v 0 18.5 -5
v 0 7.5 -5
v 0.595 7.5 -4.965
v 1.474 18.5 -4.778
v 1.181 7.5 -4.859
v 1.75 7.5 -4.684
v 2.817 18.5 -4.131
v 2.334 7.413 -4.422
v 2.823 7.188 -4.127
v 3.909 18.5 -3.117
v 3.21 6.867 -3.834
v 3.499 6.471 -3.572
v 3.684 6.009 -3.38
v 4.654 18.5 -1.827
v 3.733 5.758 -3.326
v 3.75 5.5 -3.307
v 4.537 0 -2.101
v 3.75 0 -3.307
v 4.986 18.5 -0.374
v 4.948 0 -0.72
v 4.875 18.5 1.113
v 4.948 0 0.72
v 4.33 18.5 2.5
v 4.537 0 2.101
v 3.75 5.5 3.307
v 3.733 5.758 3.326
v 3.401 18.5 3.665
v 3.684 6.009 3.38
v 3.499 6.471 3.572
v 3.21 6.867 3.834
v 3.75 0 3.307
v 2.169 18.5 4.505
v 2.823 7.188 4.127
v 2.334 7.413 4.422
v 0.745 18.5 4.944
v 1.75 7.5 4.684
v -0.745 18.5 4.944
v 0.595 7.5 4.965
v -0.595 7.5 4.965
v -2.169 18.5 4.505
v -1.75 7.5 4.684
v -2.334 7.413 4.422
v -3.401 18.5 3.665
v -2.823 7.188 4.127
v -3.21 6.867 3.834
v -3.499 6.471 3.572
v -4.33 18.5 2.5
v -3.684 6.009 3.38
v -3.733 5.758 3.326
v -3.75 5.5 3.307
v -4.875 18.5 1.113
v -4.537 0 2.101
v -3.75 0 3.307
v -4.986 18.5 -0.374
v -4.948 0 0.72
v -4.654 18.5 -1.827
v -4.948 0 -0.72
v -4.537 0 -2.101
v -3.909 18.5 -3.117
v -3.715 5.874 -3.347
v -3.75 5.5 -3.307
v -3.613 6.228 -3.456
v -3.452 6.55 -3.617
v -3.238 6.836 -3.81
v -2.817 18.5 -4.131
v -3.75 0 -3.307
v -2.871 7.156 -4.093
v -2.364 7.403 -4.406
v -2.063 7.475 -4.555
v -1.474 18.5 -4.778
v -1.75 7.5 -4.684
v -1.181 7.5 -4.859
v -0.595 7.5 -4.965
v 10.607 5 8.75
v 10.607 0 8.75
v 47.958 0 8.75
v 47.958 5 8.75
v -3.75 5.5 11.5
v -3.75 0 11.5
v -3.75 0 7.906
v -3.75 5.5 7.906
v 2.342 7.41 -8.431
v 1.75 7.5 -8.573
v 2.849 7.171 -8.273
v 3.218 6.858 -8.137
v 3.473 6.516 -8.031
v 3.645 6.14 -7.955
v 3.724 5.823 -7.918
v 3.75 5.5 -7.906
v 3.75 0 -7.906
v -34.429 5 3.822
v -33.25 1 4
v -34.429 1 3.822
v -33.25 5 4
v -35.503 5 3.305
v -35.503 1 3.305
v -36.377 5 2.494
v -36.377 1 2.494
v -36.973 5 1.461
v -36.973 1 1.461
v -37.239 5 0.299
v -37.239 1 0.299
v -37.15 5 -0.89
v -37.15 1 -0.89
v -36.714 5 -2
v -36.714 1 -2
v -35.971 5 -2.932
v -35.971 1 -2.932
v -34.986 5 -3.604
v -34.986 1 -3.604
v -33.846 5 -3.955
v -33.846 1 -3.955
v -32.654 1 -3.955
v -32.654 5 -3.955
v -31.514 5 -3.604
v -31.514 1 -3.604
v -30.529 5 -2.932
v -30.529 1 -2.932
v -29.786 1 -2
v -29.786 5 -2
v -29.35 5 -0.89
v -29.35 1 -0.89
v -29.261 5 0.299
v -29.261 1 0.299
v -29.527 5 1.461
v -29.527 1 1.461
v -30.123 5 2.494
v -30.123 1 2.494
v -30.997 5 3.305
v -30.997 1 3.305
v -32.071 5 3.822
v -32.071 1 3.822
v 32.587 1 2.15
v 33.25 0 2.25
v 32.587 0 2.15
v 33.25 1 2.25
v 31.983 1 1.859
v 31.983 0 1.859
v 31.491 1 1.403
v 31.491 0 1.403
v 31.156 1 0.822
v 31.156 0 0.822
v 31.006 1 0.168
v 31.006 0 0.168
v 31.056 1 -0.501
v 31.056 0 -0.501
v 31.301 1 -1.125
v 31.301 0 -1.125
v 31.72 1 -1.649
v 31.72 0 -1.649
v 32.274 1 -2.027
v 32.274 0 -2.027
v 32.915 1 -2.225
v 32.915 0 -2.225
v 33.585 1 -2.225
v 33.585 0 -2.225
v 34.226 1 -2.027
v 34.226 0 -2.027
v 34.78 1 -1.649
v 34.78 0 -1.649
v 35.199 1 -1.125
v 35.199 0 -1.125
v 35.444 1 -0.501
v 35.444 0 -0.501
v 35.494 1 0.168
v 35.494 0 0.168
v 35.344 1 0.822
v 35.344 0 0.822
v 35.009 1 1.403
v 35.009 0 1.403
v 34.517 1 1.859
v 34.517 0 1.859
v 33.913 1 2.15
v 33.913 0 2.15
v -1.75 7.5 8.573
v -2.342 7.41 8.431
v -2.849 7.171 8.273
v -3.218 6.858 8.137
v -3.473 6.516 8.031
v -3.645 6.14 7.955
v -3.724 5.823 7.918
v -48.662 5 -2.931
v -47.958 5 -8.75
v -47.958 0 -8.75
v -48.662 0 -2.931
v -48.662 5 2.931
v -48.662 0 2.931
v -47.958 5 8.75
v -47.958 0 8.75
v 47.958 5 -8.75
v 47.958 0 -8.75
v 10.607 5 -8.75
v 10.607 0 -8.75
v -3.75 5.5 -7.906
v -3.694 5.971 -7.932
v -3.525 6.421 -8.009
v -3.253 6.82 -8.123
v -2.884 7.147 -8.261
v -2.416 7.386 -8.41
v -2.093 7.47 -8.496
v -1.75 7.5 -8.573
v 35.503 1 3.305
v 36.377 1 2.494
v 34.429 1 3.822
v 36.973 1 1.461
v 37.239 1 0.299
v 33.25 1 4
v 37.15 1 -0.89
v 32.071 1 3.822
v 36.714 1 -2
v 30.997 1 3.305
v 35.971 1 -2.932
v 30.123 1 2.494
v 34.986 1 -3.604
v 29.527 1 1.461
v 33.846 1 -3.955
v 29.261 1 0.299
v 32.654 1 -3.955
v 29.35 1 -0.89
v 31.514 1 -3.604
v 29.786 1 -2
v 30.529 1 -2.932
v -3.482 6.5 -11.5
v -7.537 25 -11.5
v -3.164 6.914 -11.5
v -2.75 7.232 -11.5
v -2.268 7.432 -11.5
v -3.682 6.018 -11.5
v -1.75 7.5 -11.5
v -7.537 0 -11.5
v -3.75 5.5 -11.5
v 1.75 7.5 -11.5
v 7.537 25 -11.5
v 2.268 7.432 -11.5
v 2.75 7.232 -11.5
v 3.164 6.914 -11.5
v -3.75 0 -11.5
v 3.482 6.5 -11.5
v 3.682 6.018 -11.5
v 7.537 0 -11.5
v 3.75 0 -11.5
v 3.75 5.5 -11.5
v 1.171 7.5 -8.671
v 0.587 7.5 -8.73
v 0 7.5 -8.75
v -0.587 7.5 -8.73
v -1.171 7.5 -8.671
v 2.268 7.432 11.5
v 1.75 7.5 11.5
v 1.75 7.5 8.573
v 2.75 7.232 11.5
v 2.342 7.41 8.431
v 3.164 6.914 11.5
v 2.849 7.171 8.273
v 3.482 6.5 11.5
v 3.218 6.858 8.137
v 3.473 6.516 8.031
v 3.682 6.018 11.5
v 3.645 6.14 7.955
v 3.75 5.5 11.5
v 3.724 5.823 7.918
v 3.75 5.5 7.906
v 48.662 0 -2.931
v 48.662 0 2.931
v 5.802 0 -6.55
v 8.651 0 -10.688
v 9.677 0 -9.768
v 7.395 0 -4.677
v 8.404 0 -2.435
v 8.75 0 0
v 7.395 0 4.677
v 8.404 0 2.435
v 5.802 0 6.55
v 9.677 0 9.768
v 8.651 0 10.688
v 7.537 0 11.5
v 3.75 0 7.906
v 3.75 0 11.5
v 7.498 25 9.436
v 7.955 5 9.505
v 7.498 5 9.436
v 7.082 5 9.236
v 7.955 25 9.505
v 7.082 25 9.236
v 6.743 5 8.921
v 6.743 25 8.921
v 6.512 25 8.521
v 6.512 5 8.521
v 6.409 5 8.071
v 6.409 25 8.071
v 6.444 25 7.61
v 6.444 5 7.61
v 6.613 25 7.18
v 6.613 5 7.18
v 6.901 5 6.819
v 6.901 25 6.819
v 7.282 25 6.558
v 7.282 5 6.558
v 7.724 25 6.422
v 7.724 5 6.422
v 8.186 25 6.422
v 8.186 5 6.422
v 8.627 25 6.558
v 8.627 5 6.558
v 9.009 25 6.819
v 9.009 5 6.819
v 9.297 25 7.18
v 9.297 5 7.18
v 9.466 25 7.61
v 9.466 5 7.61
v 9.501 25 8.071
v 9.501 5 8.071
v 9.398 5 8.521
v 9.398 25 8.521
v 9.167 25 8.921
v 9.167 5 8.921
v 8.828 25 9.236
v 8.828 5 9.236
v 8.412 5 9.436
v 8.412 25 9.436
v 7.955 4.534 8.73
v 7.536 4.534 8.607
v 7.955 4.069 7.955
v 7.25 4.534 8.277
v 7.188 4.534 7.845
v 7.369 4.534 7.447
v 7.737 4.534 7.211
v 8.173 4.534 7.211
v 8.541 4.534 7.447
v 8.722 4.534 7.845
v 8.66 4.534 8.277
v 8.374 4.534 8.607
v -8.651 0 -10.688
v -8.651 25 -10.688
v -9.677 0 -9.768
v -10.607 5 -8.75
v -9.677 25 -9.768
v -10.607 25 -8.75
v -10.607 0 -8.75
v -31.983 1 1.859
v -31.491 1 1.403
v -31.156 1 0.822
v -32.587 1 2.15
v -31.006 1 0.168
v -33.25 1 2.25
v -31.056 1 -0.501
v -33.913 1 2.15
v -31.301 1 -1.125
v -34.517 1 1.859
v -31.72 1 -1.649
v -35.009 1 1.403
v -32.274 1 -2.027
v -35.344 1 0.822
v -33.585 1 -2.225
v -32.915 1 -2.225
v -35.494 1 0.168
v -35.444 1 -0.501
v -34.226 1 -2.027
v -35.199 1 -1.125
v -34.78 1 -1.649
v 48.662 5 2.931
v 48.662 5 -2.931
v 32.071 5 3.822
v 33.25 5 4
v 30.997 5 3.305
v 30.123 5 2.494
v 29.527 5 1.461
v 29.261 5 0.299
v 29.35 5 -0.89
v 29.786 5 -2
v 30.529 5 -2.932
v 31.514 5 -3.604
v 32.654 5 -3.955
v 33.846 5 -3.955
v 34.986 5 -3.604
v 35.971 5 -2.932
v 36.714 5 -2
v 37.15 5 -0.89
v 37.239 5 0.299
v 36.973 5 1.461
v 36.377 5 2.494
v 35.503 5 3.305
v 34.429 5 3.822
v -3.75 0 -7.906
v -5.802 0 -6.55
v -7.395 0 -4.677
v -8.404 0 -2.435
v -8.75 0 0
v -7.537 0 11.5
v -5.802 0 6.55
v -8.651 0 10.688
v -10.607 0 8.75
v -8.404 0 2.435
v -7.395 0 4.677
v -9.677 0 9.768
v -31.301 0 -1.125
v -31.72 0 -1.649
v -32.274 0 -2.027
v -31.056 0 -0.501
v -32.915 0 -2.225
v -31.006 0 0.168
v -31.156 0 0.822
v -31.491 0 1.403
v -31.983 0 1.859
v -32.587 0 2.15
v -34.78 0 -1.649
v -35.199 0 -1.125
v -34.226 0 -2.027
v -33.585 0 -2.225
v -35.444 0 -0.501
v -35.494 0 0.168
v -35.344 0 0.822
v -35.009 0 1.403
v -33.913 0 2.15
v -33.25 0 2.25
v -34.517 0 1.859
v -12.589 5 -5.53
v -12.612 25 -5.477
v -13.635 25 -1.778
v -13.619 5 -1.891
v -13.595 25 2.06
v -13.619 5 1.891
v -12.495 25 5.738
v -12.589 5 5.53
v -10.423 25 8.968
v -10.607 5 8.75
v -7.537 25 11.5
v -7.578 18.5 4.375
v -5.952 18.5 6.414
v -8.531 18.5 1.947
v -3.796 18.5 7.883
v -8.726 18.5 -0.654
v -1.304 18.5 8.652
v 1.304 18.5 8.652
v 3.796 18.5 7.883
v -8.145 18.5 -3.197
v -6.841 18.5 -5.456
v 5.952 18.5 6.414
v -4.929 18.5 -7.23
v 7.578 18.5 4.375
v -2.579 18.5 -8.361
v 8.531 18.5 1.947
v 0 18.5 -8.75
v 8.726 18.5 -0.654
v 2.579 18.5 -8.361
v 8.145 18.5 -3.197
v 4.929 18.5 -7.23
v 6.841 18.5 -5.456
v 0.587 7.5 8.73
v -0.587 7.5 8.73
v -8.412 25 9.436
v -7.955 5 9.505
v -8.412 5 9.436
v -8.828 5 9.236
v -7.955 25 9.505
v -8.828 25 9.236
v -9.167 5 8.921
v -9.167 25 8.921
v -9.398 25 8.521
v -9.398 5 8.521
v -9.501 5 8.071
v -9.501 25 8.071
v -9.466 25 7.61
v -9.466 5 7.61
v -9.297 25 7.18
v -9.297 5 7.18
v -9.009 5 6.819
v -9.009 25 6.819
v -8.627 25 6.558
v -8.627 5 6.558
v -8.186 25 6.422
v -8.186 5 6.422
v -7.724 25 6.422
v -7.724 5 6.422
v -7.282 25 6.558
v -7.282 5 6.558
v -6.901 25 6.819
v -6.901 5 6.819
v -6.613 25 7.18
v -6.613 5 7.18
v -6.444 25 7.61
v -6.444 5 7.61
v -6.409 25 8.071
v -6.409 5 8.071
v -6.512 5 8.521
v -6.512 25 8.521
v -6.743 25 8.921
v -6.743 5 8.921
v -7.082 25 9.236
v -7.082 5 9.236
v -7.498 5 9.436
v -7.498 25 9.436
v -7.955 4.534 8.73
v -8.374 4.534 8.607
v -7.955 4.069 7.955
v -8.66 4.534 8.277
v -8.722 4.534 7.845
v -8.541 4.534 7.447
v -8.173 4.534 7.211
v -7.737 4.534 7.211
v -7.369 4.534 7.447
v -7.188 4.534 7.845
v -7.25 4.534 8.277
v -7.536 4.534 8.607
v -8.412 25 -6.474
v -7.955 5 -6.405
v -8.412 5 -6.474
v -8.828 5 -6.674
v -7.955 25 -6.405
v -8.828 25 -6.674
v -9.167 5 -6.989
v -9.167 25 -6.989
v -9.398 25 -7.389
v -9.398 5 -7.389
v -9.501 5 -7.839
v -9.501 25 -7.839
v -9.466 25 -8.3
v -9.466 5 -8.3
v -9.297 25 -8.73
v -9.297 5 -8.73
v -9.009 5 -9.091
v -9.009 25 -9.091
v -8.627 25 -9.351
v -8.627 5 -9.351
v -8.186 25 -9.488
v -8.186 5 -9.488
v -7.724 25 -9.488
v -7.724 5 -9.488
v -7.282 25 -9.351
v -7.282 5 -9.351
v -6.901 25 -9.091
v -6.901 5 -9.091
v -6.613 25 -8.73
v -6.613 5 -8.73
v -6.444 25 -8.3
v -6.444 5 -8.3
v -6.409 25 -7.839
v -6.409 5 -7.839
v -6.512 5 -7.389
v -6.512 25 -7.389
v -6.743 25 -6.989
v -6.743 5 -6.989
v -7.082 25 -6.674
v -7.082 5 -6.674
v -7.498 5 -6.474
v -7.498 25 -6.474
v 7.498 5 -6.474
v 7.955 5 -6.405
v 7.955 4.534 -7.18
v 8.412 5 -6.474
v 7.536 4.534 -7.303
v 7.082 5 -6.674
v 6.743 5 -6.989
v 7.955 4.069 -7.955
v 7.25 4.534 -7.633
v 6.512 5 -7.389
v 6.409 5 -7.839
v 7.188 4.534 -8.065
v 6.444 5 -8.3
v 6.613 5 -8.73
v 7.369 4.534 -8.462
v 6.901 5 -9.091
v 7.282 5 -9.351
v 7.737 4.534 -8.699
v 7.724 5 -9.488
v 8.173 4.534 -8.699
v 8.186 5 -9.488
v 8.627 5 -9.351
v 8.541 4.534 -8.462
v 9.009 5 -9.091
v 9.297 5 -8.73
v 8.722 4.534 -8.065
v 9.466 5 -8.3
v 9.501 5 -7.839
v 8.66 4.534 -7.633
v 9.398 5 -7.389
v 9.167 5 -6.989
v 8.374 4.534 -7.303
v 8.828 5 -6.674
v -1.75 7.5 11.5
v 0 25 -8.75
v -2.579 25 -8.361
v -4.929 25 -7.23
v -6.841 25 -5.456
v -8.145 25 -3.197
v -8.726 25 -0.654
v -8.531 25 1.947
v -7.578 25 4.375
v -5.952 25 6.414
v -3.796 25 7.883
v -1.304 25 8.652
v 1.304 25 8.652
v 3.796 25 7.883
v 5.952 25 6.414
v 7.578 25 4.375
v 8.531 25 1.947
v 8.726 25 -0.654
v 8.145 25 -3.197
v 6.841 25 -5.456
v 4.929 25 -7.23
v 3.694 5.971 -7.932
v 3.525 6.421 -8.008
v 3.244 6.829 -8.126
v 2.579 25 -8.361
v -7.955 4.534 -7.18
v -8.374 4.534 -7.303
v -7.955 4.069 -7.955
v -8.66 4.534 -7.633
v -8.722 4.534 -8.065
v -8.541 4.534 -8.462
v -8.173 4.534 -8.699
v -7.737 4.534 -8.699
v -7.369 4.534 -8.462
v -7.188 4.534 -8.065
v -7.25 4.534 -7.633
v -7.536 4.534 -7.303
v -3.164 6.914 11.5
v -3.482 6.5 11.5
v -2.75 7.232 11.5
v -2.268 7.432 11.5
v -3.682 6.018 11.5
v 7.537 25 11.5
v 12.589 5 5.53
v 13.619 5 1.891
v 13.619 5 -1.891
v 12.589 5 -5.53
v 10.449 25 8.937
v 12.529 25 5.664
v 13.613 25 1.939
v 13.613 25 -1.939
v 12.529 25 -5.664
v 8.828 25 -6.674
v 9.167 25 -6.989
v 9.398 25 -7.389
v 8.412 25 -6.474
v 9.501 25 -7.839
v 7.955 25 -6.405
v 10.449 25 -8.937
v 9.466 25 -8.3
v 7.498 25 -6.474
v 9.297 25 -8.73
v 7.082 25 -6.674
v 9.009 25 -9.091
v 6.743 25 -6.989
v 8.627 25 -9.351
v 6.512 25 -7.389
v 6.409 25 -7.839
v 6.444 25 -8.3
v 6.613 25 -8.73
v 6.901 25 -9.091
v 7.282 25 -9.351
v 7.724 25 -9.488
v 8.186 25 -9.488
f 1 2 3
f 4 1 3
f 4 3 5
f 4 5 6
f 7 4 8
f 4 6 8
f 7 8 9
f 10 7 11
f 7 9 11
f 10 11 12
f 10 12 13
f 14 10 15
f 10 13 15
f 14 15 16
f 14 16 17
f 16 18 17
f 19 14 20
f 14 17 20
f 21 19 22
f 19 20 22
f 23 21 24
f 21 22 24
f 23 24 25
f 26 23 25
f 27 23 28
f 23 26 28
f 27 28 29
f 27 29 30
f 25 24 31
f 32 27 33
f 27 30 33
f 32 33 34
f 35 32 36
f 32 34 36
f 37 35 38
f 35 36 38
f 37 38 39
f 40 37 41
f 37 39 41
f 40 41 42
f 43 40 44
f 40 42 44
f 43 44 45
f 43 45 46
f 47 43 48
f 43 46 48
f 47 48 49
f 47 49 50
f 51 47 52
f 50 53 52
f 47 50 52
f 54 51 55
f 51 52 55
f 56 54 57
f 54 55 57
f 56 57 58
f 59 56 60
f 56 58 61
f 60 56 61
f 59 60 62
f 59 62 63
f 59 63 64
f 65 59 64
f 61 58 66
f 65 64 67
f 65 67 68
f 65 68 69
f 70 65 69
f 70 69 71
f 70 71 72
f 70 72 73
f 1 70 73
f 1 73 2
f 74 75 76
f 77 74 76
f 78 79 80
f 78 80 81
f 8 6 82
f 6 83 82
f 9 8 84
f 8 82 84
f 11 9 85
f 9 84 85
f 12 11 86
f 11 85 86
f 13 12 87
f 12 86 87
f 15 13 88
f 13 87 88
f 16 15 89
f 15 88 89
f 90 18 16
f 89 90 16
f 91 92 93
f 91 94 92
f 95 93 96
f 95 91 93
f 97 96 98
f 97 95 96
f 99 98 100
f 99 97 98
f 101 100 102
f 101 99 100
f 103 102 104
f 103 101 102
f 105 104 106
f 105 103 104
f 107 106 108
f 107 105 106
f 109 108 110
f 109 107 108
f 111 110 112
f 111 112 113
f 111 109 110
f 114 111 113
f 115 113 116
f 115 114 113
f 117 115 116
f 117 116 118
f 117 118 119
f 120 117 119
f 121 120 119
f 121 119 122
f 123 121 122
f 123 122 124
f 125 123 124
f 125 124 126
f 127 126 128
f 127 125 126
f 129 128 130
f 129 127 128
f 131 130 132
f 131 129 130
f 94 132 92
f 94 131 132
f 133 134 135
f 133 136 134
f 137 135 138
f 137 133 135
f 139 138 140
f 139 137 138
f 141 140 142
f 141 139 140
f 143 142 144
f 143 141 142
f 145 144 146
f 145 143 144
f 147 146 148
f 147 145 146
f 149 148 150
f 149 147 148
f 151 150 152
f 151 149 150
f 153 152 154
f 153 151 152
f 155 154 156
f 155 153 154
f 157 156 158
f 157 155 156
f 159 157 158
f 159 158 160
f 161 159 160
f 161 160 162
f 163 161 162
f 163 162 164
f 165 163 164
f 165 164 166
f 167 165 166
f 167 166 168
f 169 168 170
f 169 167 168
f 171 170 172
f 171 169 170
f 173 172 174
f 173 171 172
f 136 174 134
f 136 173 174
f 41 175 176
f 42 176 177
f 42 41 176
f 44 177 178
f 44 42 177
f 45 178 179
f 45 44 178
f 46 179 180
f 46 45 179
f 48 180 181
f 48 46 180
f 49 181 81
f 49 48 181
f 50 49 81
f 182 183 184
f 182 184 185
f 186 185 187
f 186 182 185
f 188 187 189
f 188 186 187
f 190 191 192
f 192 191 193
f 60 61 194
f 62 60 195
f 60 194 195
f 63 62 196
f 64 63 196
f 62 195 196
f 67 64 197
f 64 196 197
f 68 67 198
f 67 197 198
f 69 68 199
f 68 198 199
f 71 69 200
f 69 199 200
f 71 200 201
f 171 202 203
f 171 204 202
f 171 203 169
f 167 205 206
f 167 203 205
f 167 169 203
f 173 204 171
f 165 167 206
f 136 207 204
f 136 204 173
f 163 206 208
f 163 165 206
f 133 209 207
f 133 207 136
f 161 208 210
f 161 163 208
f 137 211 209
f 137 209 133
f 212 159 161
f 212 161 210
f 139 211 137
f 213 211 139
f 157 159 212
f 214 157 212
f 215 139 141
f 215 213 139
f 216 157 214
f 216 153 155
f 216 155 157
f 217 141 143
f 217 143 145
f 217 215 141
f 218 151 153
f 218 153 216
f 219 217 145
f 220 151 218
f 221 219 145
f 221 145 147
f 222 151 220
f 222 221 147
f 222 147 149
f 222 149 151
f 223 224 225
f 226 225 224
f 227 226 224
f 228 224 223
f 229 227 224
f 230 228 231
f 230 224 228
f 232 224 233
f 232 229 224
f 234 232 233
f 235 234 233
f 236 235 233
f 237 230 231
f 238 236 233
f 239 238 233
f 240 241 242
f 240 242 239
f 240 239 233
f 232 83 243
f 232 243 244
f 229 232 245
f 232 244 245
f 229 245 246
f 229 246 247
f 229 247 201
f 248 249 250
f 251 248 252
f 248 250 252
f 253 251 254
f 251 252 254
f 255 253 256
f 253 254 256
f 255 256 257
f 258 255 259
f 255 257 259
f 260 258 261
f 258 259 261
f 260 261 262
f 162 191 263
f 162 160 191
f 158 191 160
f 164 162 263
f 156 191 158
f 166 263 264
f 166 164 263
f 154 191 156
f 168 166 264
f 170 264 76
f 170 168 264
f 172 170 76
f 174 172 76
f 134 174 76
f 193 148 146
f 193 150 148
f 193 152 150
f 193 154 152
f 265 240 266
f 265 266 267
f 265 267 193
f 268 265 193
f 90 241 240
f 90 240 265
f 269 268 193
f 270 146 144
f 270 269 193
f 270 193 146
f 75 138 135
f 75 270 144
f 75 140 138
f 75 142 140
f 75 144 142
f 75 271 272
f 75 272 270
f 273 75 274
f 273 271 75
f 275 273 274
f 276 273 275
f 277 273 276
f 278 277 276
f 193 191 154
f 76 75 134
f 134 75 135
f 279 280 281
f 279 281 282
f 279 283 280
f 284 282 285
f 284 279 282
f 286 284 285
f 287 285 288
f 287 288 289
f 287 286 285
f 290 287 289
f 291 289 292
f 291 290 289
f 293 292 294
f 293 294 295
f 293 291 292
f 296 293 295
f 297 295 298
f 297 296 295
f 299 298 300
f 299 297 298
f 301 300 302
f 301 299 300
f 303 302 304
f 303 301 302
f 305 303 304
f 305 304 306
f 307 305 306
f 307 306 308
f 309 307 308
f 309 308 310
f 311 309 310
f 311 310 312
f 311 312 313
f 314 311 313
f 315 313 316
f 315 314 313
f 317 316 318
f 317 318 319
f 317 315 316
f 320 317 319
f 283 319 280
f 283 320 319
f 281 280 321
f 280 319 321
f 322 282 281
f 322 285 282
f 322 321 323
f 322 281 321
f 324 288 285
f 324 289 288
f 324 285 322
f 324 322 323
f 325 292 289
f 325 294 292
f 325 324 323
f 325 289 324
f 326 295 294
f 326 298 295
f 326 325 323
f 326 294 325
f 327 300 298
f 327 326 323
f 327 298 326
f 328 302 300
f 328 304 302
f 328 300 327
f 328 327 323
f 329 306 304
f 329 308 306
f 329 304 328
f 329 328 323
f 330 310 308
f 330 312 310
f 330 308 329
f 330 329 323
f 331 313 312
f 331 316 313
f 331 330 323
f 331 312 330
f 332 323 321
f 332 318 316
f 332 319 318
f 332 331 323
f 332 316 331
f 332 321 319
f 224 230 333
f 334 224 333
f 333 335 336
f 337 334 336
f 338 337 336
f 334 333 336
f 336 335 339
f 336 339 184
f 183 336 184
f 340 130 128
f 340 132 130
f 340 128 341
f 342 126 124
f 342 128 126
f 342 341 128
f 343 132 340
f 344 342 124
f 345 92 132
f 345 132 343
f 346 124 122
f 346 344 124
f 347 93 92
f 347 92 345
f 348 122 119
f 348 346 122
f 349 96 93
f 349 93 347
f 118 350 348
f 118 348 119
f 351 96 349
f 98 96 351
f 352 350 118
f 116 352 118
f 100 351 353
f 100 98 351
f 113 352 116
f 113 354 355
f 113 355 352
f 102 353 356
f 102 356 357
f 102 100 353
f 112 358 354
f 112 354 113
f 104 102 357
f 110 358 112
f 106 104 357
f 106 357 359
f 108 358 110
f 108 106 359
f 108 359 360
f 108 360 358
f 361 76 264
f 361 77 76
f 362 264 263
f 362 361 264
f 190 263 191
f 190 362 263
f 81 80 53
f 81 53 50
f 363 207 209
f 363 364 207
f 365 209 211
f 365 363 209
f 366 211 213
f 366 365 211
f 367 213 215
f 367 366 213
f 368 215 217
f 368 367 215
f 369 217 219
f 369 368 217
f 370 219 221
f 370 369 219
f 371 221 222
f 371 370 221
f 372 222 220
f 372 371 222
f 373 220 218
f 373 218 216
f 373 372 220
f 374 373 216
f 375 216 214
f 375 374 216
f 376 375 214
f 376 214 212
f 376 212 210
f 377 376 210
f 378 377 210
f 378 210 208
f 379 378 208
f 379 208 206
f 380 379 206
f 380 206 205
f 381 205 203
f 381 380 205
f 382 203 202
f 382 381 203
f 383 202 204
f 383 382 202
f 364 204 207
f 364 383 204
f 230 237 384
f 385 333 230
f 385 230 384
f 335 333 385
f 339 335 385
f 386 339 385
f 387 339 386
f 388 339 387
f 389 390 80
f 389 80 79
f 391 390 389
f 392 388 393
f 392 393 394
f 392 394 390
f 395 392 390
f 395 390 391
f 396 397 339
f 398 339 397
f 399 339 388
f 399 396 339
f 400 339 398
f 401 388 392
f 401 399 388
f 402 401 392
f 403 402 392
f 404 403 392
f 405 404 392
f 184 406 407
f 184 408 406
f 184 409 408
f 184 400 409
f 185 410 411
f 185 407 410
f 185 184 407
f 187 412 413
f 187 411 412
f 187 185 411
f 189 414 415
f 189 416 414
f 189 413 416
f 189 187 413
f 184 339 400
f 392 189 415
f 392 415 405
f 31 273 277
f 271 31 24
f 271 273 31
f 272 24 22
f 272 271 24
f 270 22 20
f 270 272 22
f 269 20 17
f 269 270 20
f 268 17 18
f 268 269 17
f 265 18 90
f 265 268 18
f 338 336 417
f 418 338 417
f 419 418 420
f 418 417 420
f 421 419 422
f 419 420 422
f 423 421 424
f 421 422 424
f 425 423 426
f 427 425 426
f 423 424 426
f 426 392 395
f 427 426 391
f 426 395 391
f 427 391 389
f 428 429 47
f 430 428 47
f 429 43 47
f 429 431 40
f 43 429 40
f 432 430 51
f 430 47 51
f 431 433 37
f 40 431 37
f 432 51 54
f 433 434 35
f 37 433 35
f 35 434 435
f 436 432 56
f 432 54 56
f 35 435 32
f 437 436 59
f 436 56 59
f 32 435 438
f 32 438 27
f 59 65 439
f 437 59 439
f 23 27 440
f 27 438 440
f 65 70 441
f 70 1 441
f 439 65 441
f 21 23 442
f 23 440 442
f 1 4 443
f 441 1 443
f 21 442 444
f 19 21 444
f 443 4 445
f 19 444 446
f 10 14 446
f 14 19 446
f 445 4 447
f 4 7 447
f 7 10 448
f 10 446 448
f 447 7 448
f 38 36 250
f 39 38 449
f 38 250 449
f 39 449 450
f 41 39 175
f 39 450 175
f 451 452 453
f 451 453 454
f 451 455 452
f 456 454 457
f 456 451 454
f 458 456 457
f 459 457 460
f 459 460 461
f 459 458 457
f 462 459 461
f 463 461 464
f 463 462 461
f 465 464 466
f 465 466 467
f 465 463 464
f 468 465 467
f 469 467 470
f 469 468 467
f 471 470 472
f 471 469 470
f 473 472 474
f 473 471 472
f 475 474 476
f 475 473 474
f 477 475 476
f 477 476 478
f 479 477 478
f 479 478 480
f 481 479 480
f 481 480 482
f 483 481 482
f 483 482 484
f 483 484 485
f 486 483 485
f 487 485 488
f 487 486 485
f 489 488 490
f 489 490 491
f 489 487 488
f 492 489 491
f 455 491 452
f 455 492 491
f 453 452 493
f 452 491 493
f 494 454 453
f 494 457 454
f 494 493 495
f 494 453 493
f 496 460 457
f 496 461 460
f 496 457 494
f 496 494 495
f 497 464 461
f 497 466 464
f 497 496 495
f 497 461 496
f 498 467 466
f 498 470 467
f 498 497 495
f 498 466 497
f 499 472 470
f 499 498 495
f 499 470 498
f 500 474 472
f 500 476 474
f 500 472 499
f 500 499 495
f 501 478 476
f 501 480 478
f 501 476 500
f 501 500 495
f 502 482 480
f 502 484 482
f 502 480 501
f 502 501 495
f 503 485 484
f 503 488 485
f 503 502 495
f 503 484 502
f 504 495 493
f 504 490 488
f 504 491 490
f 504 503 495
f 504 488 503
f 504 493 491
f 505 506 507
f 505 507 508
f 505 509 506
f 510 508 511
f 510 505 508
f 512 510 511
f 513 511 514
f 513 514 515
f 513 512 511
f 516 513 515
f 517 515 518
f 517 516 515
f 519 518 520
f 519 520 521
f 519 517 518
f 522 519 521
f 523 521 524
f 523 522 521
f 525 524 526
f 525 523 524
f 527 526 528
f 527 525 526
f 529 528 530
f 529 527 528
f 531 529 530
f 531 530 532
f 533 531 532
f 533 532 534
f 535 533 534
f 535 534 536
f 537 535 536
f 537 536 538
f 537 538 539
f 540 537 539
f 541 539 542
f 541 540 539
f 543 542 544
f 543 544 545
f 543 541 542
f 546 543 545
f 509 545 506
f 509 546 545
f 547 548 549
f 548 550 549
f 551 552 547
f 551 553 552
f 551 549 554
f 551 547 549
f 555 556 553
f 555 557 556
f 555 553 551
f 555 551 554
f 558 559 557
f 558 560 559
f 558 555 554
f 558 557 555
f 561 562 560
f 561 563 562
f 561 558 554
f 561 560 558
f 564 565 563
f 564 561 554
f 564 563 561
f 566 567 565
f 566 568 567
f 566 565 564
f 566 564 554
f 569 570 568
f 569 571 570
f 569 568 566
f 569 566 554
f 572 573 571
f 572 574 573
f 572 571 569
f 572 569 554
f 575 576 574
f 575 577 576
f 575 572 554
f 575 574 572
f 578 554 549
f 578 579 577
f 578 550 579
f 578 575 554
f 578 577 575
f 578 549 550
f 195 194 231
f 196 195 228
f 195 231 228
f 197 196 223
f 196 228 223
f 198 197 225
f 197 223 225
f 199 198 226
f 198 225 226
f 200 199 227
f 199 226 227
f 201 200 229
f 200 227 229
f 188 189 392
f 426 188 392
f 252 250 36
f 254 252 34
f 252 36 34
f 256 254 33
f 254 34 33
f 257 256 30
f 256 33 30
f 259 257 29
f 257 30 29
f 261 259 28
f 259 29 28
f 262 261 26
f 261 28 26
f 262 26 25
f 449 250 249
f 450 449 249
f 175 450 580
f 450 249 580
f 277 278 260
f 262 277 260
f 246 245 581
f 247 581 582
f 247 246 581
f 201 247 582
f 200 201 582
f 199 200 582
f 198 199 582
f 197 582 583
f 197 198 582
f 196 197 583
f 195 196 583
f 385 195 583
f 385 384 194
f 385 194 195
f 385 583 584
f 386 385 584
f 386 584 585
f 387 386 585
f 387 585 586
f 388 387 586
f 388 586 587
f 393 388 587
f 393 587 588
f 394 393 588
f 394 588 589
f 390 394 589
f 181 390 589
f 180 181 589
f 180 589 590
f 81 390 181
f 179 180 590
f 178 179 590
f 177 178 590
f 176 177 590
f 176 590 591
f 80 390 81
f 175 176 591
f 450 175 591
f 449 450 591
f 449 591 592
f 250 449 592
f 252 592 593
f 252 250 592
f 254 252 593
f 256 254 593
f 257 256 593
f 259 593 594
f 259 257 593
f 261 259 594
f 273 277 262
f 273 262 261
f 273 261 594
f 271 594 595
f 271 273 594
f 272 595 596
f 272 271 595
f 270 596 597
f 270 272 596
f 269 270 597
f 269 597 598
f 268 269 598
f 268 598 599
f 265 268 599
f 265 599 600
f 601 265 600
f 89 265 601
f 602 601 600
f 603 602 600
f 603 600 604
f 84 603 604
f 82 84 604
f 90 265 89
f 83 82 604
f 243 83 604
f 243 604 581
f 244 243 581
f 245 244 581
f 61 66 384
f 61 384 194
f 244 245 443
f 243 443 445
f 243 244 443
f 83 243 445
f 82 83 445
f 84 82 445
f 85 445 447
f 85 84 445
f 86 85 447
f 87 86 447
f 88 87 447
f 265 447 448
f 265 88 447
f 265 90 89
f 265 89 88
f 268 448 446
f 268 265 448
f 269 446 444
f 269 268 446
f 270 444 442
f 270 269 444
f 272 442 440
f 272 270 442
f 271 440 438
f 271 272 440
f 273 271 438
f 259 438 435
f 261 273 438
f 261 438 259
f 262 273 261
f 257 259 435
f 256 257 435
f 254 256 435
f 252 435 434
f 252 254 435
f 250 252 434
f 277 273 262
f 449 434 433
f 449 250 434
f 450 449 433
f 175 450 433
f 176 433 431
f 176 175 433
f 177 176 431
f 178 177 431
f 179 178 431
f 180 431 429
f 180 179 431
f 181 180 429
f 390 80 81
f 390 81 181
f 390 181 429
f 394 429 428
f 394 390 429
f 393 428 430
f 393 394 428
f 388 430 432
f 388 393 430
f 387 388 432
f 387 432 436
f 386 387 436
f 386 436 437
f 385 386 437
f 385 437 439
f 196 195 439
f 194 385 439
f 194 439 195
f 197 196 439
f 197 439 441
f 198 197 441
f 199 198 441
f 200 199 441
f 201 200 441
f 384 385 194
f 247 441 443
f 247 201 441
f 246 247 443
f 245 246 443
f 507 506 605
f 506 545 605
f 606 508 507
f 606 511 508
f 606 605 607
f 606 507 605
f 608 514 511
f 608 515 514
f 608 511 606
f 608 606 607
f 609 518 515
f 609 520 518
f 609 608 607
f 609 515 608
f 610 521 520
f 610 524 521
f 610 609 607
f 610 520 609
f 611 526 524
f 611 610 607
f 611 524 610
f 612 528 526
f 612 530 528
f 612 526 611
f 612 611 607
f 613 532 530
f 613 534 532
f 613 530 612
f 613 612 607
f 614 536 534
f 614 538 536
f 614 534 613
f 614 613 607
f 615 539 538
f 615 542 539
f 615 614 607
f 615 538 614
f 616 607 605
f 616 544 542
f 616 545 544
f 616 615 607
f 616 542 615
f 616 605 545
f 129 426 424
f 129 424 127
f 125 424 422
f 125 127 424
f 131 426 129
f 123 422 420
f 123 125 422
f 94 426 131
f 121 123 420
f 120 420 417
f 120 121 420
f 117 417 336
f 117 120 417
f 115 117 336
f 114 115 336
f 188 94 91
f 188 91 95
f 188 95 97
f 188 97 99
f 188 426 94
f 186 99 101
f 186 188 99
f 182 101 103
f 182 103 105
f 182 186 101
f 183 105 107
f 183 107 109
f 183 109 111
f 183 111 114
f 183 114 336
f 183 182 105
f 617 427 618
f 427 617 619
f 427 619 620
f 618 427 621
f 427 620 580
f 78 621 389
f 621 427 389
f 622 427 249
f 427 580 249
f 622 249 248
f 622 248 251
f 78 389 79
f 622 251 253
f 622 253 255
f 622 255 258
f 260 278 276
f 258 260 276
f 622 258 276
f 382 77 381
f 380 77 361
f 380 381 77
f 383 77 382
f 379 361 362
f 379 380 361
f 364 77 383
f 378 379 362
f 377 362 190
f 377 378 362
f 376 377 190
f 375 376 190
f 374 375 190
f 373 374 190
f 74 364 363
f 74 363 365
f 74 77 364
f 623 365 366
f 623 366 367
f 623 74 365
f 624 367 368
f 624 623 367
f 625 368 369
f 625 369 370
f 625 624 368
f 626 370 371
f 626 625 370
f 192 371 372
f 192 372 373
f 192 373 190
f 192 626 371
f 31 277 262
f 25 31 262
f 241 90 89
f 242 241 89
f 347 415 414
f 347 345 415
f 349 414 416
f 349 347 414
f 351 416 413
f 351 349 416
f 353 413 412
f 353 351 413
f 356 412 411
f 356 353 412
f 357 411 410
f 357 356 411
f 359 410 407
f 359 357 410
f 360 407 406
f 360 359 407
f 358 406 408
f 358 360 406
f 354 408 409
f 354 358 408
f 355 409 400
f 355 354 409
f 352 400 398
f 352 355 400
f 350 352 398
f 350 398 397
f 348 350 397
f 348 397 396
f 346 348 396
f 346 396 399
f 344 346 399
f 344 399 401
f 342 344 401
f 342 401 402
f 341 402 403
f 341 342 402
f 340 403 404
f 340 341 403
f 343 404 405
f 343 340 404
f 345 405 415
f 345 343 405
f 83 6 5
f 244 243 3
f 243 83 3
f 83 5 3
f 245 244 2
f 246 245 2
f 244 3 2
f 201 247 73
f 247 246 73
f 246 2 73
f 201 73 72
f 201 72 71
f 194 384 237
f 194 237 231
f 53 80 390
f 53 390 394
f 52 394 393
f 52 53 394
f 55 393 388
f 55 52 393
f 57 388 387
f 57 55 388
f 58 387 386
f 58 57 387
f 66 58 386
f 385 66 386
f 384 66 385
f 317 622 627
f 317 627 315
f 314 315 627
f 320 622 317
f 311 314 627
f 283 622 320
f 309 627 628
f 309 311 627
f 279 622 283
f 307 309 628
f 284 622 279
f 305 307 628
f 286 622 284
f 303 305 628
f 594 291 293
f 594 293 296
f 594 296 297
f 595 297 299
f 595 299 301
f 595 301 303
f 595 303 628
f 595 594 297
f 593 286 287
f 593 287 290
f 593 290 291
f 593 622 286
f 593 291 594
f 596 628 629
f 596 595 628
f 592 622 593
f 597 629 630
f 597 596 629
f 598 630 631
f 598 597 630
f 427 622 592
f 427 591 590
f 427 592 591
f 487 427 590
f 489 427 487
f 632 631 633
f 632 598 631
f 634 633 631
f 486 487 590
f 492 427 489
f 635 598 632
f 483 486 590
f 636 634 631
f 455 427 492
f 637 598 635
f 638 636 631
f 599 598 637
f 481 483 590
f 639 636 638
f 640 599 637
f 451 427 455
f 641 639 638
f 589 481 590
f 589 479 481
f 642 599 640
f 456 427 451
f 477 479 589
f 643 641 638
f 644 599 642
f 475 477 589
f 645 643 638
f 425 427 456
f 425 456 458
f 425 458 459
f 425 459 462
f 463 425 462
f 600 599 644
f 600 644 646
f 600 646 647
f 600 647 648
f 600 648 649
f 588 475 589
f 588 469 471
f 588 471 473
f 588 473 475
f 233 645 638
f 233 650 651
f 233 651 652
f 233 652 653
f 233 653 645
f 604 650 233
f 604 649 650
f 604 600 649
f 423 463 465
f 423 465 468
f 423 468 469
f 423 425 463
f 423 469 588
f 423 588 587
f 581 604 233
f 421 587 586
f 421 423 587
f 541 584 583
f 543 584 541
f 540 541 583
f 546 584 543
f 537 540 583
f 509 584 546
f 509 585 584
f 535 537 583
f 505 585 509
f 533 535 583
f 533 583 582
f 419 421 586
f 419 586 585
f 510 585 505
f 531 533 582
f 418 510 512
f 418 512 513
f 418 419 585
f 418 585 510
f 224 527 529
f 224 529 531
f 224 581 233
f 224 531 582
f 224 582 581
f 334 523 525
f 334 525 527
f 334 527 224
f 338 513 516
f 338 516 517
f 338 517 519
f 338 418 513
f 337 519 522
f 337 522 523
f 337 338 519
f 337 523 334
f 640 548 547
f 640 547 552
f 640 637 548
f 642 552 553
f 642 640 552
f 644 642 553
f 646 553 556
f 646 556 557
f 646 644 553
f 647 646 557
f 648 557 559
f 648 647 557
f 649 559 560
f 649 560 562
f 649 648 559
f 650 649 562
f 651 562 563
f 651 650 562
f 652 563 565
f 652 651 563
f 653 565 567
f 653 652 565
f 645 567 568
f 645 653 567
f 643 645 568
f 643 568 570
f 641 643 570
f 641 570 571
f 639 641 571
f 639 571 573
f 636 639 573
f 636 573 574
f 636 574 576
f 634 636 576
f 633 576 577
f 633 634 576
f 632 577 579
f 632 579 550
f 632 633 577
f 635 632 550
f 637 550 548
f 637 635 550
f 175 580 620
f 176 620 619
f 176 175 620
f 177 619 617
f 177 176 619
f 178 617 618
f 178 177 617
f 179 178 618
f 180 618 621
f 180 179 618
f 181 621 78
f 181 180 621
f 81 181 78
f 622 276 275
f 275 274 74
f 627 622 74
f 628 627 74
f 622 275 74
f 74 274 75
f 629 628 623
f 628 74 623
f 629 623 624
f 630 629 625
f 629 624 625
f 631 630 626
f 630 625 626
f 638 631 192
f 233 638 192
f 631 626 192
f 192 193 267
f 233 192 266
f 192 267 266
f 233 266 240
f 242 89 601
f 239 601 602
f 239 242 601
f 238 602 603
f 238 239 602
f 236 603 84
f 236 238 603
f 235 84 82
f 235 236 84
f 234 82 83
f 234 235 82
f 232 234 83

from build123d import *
from build123d.topology import SkipClean

# Parameters (mm, degrees)
SKETCH2_R                      = 8.75
SKETCH2_R_2                    = 5
BOSS_EXTRUDE1_DEPTH            = 18.5
CUT_EXTRUDE1_DEPTH             = 72.785270077
CUT_EXTRUDE1_DEPTH_BACK        = 72.785270077
CBORE_FOR_M4_SHCS1_AT_2_COUNT  = 2
CBORE_FOR_M4_SHCS1_AT_2_PITCH  = 66.5
CUT_EXTRUDE2_DEPTH             = 60.226788702
CUT_EXTRUDE2_DEPTH_BACK        = 60.226788702
SKETCH10_W                     = 7.5
SKETCH10_H                     = 7.5
FILLET2_R                      = 2
FILLET3_R                      = 2
FILLET4_R                      = 2
FILLET5_R                      = 2
FILLET6_R                      = 2
FILLET7_R                      = 2
FILLET8_R                      = 2
FILLET9_R                      = 2
F_1_0MM_DOWEL_HOLE1_AT_2_COUNT = 2
F_1_0MM_DOWEL_HOLE1_AT_2_PITCH = 15.909902577
F_1_0MM_DOWEL_HOLE1_AT_3_COUNT = 2
F_1_0MM_DOWEL_HOLE1_AT_3_PITCH = 22.5
F_1_0MM_DOWEL_HOLE1_AT_4_COUNT = 2
F_1_0MM_DOWEL_HOLE1_AT_4_PITCH = 15.909902577
CUT_EXTRUDE3_DEPTH             = 57.485617707
CUT_EXTRUDE3_DEPTH_BACK        = 57.485617707
SKETCH14_W                     = 15.074813432
SKETCH14_H                     = 4.328777268
SKETCH14_H_2                   = 4.395498361


with BuildPart() as part:
    # Sketch1 → Revolve1 (revolve)
    with BuildSketch(Plane(origin=(0, 0, 0), x_dir=(0, 0, -1), z_dir=(1, 0, 0)), mode=Mode.PRIVATE) as revolve1_sk:
        Polygon((-8.75, 0), (-48.75, 0), (-48.75, 5), (-13.75, 5), (-13.75, 25), (-8.75, 25), align=None)
    revolve(revolve1_sk.sketch.rotate(Axis((0, -1.25, 0), (0, 1, 0)), 180), axis=Axis((0, -1.25, 0), (0, 1, 0)))

    # Sketch3 → Cut-Extrude1 (cut, two sides: drawn at the far end of the back side and taken through both)
    with SkipClean():  # the faces are left unmerged after this step: merging them gives an invalid solid
        with BuildSketch(Plane(origin=(0, 5, 0), x_dir=(1, 0, 0), z_dir=(0, 1, 0)).offset(-CUT_EXTRUDE1_DEPTH_BACK)):
            with BuildLine():
                Line((-50, -8.75), (-10.606601718, -8.75))
                ThreePointArc((-10.606601718, -8.75), (0, -13.75), (10.606601718, -8.75))
                Line((10.606601718, -8.75), (50, -8.75))
                Line((50, -8.75), (50, -58.75))
                Line((50, -58.75), (-50, -58.75))
                Line((-50, -58.75), (-50, -8.75))
            make_face()
            with BuildLine():
                Line((50, 8.75), (10.606601718, 8.75))
                ThreePointArc((10.606601718, 8.75), (0, 13.75), (-10.606601718, 8.75))
                Line((-10.606601718, 8.75), (-50, 8.75))
                Line((-50, 8.75), (-50, 58.75))
                Line((-50, 58.75), (50, 58.75))
                Line((50, 58.75), (50, 8.75))
            make_face()
        extrude(amount=CUT_EXTRUDE1_DEPTH + CUT_EXTRUDE1_DEPTH_BACK, mode=Mode.SUBTRACT)

    # Sketch9 → CBORE for M4 SHCS1 (revolve, cut)
    with SkipClean():  # the faces are left unmerged after this step: merging them gives an invalid solid
        with BuildSketch(Plane(origin=(-33.25, 5, 0), x_dir=(0, 0, 1), z_dir=(1, 0, 0))):
            Polygon((0, 0), (0, 5), (2.25, 5), (2.25, 4), (4, 4), (4, 0), align=None)
        cbore_for_m4_shcs1 = revolve(axis=Axis((-33.25, 11.35, 0), (0, -1, 0)), mode=Mode.SUBTRACT)

    # CBORE for M4 SHCS1 at 2: CBORE for M4 SHCS1 ×2
    with SkipClean():  # the faces are left unmerged after this step: merging them gives an invalid solid
        with Locations(*[(i * CBORE_FOR_M4_SHCS1_AT_2_PITCH, 0, 0) for i in range(1, CBORE_FOR_M4_SHCS1_AT_2_COUNT)]):
            add(cbore_for_m4_shcs1, mode=Mode.SUBTRACT)


with BuildPart() as body_2:
    # Sketch2 → Boss-Extrude1 (new body)
    with BuildSketch(Plane.XZ):
        with Locations(Location((0, 0, 0), (0, 0, 270))):
            Circle(SKETCH2_R)
        with Locations(Location((0, 0, 0), (0, 0, 270))):
            Circle(SKETCH2_R_2, mode=Mode.SUBTRACT)
    extrude(amount=-BOSS_EXTRUDE1_DEPTH)


with BuildPart() as cut_extrude2_tool:
    # Sketch10 → Cut-Extrude2 (new, two sides: drawn at the far end of the back side and taken through both)
    with SkipClean():  # the faces are left unmerged after this step: merging them gives an invalid solid
        with BuildSketch(Plane(origin=(0, 0, -8.75), x_dir=(-1, 0, 0), z_dir=(0, 0, -1)).offset(-CUT_EXTRUDE2_DEPTH_BACK)):
            with Locations((0, 3.75)):
                Rectangle(SKETCH10_W, SKETCH10_H)
        extrude(amount=CUT_EXTRUDE2_DEPTH + CUT_EXTRUDE2_DEPTH_BACK)


with BuildPart() as part_1:
    with SkipClean():  # the faces are left unmerged after this step: merging them gives an invalid solid
        add(part.part)

        # Cut-Extrude2: cut by cut_extrude2_tool
        add(cut_extrude2_tool.part, mode=Mode.SUBTRACT)

    # Fillet2
    fillet2_edges = [part_1.edges().sort_by_distance(p)[0] for p in [
        (3.75, 7.5, 10.567225353),
    ]]
    fillet(fillet2_edges, radius=FILLET2_R)

    # Fillet3
    fillet3_edges = [part_1.edges().sort_by_distance(p)[0] for p in [
        (-3.75, 7.5, 10.567225353),
    ]]
    fillet(fillet3_edges, radius=FILLET3_R)

    # Fillet7
    fillet7_edges = [part_1.edges().sort_by_distance(p)[0] for p in [
        (-3.75, 7.5, -10.567225353),
    ]]
    fillet(fillet7_edges, radius=FILLET7_R)

    # Fillet8
    fillet8_edges = [part_1.edges().sort_by_distance(p)[0] for p in [
        (3.75, 7.5, -10.567225353),
    ]]
    fillet(fillet8_edges, radius=FILLET8_R)

    # Sketch12 → Ø1.0mm Dowel Hole1 (revolve, cut)
    with SkipClean():  # the faces are left unmerged after this step: merging them gives an invalid solid
        with BuildSketch(Plane(origin=(-7.954951288, 25, -7.954951288), x_dir=(0, 0, 1), z_dir=(1, 0, 0))):
            Polygon((0, 0), (0, 20.931333959), (1.55, 20), (1.55, 0), align=None)
        f_1_0mm_dowel_hole1 = revolve(axis=Axis((-7.954951288, 31.35, -7.954951288), (0, -1, 0)), mode=Mode.SUBTRACT)

    # Ø1.0mm Dowel Hole1 at 2: Ø1.0mm Dowel Hole1 ×2
    with SkipClean():  # the faces are left unmerged after this step: merging them gives an invalid solid
        with Locations(*[(i * F_1_0MM_DOWEL_HOLE1_AT_2_PITCH, 0, 0) for i in range(1, F_1_0MM_DOWEL_HOLE1_AT_2_COUNT)]):
            add(f_1_0mm_dowel_hole1, mode=Mode.SUBTRACT)

    # Ø1.0mm Dowel Hole1 at 3: Ø1.0mm Dowel Hole1 ×2
    with SkipClean():  # the faces are left unmerged after this step: merging them gives an invalid solid
        with Locations(*[Vector(0.707106781186549, 0, 0.7071067811865461) * (i * F_1_0MM_DOWEL_HOLE1_AT_3_PITCH) for i in range(1, F_1_0MM_DOWEL_HOLE1_AT_3_COUNT)]):
            add(f_1_0mm_dowel_hole1, mode=Mode.SUBTRACT)

    # Ø1.0mm Dowel Hole1 at 4: Ø1.0mm Dowel Hole1 ×2
    with SkipClean():  # the faces are left unmerged after this step: merging them gives an invalid solid
        with Locations(*[(0, 0, i * F_1_0MM_DOWEL_HOLE1_AT_4_PITCH) for i in range(1, F_1_0MM_DOWEL_HOLE1_AT_4_COUNT)]):
            add(f_1_0mm_dowel_hole1, mode=Mode.SUBTRACT)

    # Sketch14 → Cut-Extrude3 (cut, two sides: drawn at the far end of the back side and taken through both)
    with SkipClean():  # the faces are left unmerged after this step: merging them gives an invalid solid
        with BuildSketch(Plane(origin=(0, 25, 0), x_dir=(1, 0, 0), z_dir=(0, 1, 0)).offset(-CUT_EXTRUDE3_DEPTH_BACK)):
            with Locations((0, -13.664388634)):
                Rectangle(SKETCH14_W, SKETCH14_H)
            with Locations((0, 13.697749181)):
                Rectangle(SKETCH14_W, SKETCH14_H_2)
        extrude(amount=CUT_EXTRUDE3_DEPTH + CUT_EXTRUDE3_DEPTH_BACK, mode=Mode.SUBTRACT)


with BuildPart() as body_2_1:
    with SkipClean():  # the faces are left unmerged after this step: merging them gives an invalid solid
        add(body_2.part)

        # Cut-Extrude2: cut by cut_extrude2_tool
        add(cut_extrude2_tool.part, mode=Mode.SUBTRACT)

    # Fillet4
    fillet4_edges = [body_2_1.edges().sort_by_distance(p)[0] for p in [
        (-3.75, 7.5, 5.606441645),
    ]]
    fillet(fillet4_edges, radius=FILLET4_R)

    # Fillet5
    fillet5_edges = [body_2_1.edges().sort_by_distance(p)[0] for p in [
        (3.75, 7.5, 5.606441645),
    ]]
    fillet(fillet5_edges, radius=FILLET5_R)

    # Fillet6
    fillet6_edges = [body_2_1.edges().sort_by_distance(p)[0] for p in [
        (-3.75, 7.5, -5.606441645),
    ]]
    fillet(fillet6_edges, radius=FILLET6_R)

    # Fillet9
    fillet9_edges = [body_2_1.edges().sort_by_distance(p)[0] for p in [
        (3.75, 7.5, -5.606441645),
    ]]
    fillet(fillet9_edges, radius=FILLET9_R)


solid = Compound([part_1.part, body_2_1.part])
